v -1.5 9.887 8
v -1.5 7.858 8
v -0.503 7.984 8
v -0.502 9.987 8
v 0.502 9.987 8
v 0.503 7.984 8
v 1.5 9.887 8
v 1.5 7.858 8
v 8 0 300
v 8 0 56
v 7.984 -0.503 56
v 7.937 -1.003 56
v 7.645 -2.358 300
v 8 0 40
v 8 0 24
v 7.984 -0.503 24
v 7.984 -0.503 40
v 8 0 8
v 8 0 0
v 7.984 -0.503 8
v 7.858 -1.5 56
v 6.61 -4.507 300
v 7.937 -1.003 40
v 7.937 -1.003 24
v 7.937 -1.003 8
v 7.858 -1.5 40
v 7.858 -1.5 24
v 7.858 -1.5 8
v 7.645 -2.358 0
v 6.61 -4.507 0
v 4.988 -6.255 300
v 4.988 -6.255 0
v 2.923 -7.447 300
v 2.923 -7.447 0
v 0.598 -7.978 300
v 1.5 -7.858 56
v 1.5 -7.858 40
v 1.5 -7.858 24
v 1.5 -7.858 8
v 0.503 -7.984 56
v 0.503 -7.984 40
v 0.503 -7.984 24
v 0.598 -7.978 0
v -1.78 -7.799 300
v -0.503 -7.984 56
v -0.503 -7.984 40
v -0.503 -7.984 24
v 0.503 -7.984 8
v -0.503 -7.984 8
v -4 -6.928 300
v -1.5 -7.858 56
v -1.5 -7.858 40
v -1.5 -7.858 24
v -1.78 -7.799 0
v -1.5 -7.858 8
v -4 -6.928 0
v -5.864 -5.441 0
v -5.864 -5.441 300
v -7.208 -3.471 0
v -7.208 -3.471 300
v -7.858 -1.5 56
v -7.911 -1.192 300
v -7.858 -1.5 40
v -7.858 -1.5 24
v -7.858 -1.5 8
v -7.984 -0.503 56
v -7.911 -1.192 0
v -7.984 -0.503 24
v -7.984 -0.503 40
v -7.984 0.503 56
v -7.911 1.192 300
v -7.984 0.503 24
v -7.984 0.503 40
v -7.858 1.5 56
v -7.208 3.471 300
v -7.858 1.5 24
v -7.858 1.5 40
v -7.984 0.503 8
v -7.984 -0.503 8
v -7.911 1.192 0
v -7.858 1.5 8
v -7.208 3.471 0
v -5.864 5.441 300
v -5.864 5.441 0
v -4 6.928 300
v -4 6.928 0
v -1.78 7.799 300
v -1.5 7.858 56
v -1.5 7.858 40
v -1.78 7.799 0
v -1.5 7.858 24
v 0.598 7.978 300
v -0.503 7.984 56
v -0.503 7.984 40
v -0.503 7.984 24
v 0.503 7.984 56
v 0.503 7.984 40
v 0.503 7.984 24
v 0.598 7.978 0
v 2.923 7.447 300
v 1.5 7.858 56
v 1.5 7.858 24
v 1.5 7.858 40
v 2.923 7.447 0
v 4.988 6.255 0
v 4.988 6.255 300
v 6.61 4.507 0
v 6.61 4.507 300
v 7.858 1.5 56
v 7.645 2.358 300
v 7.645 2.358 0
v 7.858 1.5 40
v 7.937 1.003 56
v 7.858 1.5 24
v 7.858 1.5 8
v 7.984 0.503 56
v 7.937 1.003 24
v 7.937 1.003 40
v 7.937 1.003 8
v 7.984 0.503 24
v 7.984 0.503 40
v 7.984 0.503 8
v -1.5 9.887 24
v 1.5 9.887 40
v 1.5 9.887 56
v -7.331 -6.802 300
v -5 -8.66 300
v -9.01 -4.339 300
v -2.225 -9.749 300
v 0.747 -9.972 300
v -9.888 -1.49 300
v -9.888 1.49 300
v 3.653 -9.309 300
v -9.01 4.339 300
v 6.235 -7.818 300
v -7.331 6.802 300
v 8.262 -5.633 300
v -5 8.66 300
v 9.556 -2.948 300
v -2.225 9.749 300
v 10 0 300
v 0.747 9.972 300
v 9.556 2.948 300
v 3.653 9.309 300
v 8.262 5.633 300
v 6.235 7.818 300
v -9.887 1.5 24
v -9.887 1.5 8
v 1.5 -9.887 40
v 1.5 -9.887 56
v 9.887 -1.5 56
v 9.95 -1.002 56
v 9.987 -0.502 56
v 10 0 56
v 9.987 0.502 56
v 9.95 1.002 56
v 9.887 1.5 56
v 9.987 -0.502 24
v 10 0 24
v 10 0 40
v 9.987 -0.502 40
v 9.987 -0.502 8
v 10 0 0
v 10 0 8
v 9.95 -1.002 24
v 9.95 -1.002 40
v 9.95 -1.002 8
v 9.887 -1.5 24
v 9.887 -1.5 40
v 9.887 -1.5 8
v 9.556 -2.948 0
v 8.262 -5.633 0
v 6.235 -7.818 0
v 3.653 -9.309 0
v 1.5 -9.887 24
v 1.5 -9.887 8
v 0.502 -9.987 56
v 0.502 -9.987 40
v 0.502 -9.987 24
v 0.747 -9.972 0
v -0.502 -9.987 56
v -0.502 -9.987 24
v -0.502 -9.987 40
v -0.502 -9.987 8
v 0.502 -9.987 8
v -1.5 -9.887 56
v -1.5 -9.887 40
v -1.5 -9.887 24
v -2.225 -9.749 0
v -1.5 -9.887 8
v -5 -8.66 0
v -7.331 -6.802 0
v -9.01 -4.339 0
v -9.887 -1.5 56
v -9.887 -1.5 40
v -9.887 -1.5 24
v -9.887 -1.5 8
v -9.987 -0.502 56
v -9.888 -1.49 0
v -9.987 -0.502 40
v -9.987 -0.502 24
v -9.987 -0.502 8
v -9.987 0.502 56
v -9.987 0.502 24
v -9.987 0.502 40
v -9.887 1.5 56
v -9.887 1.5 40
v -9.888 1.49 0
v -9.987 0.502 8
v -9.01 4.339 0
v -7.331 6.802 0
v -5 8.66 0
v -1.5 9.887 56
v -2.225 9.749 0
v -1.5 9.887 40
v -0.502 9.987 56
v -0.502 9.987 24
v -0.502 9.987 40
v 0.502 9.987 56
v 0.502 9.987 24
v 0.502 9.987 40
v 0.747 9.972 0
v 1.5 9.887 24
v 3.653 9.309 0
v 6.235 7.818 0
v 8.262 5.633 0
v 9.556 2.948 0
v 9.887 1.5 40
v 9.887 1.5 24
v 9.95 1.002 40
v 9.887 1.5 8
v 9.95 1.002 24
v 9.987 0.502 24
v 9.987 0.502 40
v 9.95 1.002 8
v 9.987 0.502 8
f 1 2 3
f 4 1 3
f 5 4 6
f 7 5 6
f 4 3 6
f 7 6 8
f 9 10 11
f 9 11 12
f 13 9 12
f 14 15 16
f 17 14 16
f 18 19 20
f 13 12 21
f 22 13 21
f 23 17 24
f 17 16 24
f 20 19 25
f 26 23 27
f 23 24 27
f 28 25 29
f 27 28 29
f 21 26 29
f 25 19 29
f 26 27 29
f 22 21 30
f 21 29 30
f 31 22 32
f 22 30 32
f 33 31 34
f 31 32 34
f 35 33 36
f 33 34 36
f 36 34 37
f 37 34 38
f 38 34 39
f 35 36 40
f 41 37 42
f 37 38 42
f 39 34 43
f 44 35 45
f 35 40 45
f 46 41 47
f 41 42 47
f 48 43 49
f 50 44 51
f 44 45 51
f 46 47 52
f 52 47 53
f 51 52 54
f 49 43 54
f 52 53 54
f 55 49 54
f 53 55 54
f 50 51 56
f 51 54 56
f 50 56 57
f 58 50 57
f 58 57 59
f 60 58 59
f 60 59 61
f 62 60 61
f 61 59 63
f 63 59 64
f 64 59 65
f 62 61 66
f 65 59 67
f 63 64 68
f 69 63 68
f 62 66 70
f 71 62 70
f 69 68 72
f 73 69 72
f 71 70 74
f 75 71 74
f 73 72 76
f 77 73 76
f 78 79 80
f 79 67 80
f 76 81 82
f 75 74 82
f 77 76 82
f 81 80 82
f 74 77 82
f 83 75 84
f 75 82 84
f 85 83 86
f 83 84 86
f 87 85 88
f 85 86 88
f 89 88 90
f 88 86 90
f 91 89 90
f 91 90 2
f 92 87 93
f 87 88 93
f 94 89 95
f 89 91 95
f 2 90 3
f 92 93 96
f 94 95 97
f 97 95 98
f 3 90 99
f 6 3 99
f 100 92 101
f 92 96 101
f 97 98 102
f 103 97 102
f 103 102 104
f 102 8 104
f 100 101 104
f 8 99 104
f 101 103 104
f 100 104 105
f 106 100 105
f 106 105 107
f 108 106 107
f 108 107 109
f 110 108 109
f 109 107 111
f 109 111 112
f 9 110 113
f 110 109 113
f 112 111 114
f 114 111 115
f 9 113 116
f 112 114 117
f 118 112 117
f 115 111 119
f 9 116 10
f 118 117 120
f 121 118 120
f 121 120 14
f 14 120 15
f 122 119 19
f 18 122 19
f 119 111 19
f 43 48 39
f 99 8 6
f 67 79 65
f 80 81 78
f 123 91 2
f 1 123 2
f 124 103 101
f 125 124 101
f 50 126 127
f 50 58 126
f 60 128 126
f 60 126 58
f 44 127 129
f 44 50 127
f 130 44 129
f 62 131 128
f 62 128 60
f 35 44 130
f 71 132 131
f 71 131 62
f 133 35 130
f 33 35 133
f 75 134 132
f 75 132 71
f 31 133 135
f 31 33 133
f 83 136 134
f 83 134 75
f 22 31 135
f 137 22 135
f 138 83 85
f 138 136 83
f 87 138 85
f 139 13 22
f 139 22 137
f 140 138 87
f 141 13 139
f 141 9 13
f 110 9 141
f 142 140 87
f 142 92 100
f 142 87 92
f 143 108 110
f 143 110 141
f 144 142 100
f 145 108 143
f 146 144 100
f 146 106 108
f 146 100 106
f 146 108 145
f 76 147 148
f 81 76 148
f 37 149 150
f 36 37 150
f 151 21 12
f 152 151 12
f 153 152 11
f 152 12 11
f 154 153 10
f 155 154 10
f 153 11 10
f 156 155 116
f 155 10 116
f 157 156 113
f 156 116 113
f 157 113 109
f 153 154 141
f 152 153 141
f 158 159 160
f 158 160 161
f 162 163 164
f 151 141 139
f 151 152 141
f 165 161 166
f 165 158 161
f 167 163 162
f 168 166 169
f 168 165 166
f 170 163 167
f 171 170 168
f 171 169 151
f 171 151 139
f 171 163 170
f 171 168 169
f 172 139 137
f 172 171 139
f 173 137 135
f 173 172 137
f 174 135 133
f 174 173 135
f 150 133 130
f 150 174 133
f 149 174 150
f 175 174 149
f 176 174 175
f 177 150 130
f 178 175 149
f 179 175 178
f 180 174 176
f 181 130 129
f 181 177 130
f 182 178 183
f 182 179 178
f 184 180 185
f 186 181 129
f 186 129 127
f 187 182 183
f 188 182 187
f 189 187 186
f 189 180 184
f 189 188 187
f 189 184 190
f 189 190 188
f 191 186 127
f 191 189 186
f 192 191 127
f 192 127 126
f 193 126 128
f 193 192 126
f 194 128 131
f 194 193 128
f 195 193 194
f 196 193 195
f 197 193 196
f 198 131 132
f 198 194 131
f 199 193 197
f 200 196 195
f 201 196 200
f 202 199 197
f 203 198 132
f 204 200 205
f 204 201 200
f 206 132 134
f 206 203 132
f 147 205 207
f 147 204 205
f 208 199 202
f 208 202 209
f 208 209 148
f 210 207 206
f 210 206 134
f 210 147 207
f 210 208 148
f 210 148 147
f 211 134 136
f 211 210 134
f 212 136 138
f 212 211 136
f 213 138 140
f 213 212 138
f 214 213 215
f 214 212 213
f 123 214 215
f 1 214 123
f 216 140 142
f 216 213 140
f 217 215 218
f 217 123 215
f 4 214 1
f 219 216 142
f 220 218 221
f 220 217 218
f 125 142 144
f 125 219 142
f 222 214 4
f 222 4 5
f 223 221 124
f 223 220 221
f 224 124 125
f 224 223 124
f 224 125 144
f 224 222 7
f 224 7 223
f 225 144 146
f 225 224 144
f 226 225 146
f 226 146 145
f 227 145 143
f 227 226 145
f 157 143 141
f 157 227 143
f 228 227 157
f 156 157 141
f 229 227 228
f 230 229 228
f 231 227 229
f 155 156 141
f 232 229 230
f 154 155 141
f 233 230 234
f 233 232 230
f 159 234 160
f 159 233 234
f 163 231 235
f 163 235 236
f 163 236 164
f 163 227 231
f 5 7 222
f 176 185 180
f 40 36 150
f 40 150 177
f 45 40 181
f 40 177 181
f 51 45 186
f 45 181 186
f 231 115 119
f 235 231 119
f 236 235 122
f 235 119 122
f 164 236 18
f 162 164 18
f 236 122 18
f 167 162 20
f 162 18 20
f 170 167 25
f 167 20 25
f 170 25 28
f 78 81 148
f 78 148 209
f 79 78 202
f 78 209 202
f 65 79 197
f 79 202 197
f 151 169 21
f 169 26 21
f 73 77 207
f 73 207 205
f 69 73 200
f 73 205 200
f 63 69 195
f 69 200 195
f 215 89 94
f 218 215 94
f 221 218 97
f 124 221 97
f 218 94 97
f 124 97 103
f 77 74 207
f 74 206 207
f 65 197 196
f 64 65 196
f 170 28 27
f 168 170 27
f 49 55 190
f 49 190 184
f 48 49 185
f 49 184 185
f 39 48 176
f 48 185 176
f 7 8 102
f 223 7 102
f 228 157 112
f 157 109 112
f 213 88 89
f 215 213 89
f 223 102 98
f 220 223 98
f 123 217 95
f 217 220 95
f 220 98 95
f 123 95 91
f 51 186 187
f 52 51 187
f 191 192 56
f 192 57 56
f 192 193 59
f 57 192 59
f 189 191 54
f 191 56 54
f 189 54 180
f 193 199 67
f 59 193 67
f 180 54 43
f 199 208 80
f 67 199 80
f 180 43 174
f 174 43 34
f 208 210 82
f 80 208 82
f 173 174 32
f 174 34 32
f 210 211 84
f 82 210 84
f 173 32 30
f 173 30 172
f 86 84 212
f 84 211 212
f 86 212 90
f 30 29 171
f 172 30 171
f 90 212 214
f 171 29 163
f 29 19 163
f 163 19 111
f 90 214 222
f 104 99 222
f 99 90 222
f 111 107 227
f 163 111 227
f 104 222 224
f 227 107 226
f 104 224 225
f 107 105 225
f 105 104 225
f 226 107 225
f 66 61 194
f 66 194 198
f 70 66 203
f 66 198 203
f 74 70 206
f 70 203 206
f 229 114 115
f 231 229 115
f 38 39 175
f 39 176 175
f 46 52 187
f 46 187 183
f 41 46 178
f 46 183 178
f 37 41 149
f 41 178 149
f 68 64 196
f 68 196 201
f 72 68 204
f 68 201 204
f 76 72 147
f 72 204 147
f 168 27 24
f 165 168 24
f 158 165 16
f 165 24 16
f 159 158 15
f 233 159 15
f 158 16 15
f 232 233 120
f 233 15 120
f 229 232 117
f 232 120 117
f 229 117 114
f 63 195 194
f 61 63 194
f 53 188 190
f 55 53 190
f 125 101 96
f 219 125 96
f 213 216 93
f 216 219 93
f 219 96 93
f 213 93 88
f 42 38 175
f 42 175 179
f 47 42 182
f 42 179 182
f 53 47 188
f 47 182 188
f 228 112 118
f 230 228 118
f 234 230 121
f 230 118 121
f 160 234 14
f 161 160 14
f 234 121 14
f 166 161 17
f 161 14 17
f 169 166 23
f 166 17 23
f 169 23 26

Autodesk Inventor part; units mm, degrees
ref_plane "YZ Plane" through (0, 0, 0) normal (1, 0, 0) x (0, 1, 0)
ref_plane "XZ Plane" through (0, 0, 0) normal (0, 1, 0) x (-1, 0, 0)
ref_plane "XY Plane" through (0, 0, 0) normal (0, 0, 1) x (1, 0, 0)
sketch "Sketch1" plane through (0, 0, 0) normal (0, 0, 1) x (1, 0, 0)
  circle A0 centre (0, 0) radius 10
  circle A1 centre (0, 0) radius 8
  dimension "d0" = 16
  dimension "d1" = 20
extrude "Extrusion1" add sketch "Sketch1" along normal blind 300
sketch "Sketch2" plane through (0, 0, 0) normal (0, 1, 0) x (-1, 0, 0)
  line L0 (1.5, 8) -> (-1.5, 8)
  line L1 (-1.5, 8) -> (-1.5, 24)
  line L2 (-1.5, 24) -> (1.5, 24)
  line L3 (1.5, 24) -> (1.5, 8)
  line L4 (-1.5, 46.9938) -> (-10, 46.9938)
  line L5 (-10, 0) -> (-10, 300) projected
  line L6 (1.5, 47.6647) -> (10, 47.6647)
  line L7 (10, 0) -> (10, 300) projected
  line L8 (10, 0) -> (-10, 0) projected
  line L9 (1.5, 40) -> (-1.5, 40)
  line L10 (-1.5, 40) -> (-1.5, 56)
  line L11 (-1.5, 56) -> (1.5, 56)
  line L12 (1.5, 56) -> (1.5, 40)
  point P0 (0, 0)
  dimension "d4" = 3
  dimension "d5" = 16
  dimension "d6" = 8
  dimension "d7" = 16
  dimension "d8" = 3
  dimension "d9" = 16
extrude "Extrusion2" cut sketch "Sketch2" along normal through all both and the other way through all contours L0 L1 L2 L3 | L10 L11 L12 L9
sketch "Sketch3" plane through (0, 0, 0) normal (1, 0, 0) x (0, 1, 0)
  line L0 (1.5, 8) -> (-1.5, 8)
  line L1 (-1.5, 8) -> (-1.5, 24)
  line L2 (-1.5, 24) -> (1.5, 24)
  line L3 (1.5, 24) -> (1.5, 8)
  line L4 (-1.5, 46.9938) -> (-10, 46.9938)
  line L5 (1.5, 47.6647) -> (10, 47.6647)
  line L6 (10, 0) -> (-10, 0)
  line L7 (1.5, 40) -> (-1.5, 40)
  line L8 (-1.5, 40) -> (-1.5, 56)
  line L9 (-1.5, 56) -> (1.5, 56)
  line L10 (1.5, 56) -> (1.5, 40)
  line L11 (1.5, 18.1726) -> (10, 18.1726)
  line L12 (10, 0) -> (10, 300) projected
  line L13 (-1.5, 20.0085) -> (-10, 20.0085)
  line L14 (-10, 0) -> (-10, 300) projected
  point P0 (0, 0)
  point P1 (0, 0)
  dimension "d12" = 3
  dimension "d13" = 16
  dimension "d15" = 16
  dimension "d16" = 3
  dimension "d17" = 16
  dimension "d18" = 8
extrude "Extrusion3" cut sketch "Sketch3" along normal through all both and the other way through all contours L0 L1 L2 L3 | L10 L7 L8 L9
equation "\"BendRadius\" = Thickness"
equation "\"BendReliefWidth\" = Thickness"
equation "\"BendReliefDepth\" = 0.5 * Thickness"
equation "\"CornerReliefSize\" = 4 * Thickness"
equation "\"MinimumRemnant\" = 2 * Thickness"
equation "\"TransitionRadius\" = BendRadius"
equation "\"JacobiRadiusSize\" = BendRadius"
equation "\"GapSize\" = Thickness"
equation "\"Thickness\" = 0.5"
properties part number "tail" material "PVC-Piping"
